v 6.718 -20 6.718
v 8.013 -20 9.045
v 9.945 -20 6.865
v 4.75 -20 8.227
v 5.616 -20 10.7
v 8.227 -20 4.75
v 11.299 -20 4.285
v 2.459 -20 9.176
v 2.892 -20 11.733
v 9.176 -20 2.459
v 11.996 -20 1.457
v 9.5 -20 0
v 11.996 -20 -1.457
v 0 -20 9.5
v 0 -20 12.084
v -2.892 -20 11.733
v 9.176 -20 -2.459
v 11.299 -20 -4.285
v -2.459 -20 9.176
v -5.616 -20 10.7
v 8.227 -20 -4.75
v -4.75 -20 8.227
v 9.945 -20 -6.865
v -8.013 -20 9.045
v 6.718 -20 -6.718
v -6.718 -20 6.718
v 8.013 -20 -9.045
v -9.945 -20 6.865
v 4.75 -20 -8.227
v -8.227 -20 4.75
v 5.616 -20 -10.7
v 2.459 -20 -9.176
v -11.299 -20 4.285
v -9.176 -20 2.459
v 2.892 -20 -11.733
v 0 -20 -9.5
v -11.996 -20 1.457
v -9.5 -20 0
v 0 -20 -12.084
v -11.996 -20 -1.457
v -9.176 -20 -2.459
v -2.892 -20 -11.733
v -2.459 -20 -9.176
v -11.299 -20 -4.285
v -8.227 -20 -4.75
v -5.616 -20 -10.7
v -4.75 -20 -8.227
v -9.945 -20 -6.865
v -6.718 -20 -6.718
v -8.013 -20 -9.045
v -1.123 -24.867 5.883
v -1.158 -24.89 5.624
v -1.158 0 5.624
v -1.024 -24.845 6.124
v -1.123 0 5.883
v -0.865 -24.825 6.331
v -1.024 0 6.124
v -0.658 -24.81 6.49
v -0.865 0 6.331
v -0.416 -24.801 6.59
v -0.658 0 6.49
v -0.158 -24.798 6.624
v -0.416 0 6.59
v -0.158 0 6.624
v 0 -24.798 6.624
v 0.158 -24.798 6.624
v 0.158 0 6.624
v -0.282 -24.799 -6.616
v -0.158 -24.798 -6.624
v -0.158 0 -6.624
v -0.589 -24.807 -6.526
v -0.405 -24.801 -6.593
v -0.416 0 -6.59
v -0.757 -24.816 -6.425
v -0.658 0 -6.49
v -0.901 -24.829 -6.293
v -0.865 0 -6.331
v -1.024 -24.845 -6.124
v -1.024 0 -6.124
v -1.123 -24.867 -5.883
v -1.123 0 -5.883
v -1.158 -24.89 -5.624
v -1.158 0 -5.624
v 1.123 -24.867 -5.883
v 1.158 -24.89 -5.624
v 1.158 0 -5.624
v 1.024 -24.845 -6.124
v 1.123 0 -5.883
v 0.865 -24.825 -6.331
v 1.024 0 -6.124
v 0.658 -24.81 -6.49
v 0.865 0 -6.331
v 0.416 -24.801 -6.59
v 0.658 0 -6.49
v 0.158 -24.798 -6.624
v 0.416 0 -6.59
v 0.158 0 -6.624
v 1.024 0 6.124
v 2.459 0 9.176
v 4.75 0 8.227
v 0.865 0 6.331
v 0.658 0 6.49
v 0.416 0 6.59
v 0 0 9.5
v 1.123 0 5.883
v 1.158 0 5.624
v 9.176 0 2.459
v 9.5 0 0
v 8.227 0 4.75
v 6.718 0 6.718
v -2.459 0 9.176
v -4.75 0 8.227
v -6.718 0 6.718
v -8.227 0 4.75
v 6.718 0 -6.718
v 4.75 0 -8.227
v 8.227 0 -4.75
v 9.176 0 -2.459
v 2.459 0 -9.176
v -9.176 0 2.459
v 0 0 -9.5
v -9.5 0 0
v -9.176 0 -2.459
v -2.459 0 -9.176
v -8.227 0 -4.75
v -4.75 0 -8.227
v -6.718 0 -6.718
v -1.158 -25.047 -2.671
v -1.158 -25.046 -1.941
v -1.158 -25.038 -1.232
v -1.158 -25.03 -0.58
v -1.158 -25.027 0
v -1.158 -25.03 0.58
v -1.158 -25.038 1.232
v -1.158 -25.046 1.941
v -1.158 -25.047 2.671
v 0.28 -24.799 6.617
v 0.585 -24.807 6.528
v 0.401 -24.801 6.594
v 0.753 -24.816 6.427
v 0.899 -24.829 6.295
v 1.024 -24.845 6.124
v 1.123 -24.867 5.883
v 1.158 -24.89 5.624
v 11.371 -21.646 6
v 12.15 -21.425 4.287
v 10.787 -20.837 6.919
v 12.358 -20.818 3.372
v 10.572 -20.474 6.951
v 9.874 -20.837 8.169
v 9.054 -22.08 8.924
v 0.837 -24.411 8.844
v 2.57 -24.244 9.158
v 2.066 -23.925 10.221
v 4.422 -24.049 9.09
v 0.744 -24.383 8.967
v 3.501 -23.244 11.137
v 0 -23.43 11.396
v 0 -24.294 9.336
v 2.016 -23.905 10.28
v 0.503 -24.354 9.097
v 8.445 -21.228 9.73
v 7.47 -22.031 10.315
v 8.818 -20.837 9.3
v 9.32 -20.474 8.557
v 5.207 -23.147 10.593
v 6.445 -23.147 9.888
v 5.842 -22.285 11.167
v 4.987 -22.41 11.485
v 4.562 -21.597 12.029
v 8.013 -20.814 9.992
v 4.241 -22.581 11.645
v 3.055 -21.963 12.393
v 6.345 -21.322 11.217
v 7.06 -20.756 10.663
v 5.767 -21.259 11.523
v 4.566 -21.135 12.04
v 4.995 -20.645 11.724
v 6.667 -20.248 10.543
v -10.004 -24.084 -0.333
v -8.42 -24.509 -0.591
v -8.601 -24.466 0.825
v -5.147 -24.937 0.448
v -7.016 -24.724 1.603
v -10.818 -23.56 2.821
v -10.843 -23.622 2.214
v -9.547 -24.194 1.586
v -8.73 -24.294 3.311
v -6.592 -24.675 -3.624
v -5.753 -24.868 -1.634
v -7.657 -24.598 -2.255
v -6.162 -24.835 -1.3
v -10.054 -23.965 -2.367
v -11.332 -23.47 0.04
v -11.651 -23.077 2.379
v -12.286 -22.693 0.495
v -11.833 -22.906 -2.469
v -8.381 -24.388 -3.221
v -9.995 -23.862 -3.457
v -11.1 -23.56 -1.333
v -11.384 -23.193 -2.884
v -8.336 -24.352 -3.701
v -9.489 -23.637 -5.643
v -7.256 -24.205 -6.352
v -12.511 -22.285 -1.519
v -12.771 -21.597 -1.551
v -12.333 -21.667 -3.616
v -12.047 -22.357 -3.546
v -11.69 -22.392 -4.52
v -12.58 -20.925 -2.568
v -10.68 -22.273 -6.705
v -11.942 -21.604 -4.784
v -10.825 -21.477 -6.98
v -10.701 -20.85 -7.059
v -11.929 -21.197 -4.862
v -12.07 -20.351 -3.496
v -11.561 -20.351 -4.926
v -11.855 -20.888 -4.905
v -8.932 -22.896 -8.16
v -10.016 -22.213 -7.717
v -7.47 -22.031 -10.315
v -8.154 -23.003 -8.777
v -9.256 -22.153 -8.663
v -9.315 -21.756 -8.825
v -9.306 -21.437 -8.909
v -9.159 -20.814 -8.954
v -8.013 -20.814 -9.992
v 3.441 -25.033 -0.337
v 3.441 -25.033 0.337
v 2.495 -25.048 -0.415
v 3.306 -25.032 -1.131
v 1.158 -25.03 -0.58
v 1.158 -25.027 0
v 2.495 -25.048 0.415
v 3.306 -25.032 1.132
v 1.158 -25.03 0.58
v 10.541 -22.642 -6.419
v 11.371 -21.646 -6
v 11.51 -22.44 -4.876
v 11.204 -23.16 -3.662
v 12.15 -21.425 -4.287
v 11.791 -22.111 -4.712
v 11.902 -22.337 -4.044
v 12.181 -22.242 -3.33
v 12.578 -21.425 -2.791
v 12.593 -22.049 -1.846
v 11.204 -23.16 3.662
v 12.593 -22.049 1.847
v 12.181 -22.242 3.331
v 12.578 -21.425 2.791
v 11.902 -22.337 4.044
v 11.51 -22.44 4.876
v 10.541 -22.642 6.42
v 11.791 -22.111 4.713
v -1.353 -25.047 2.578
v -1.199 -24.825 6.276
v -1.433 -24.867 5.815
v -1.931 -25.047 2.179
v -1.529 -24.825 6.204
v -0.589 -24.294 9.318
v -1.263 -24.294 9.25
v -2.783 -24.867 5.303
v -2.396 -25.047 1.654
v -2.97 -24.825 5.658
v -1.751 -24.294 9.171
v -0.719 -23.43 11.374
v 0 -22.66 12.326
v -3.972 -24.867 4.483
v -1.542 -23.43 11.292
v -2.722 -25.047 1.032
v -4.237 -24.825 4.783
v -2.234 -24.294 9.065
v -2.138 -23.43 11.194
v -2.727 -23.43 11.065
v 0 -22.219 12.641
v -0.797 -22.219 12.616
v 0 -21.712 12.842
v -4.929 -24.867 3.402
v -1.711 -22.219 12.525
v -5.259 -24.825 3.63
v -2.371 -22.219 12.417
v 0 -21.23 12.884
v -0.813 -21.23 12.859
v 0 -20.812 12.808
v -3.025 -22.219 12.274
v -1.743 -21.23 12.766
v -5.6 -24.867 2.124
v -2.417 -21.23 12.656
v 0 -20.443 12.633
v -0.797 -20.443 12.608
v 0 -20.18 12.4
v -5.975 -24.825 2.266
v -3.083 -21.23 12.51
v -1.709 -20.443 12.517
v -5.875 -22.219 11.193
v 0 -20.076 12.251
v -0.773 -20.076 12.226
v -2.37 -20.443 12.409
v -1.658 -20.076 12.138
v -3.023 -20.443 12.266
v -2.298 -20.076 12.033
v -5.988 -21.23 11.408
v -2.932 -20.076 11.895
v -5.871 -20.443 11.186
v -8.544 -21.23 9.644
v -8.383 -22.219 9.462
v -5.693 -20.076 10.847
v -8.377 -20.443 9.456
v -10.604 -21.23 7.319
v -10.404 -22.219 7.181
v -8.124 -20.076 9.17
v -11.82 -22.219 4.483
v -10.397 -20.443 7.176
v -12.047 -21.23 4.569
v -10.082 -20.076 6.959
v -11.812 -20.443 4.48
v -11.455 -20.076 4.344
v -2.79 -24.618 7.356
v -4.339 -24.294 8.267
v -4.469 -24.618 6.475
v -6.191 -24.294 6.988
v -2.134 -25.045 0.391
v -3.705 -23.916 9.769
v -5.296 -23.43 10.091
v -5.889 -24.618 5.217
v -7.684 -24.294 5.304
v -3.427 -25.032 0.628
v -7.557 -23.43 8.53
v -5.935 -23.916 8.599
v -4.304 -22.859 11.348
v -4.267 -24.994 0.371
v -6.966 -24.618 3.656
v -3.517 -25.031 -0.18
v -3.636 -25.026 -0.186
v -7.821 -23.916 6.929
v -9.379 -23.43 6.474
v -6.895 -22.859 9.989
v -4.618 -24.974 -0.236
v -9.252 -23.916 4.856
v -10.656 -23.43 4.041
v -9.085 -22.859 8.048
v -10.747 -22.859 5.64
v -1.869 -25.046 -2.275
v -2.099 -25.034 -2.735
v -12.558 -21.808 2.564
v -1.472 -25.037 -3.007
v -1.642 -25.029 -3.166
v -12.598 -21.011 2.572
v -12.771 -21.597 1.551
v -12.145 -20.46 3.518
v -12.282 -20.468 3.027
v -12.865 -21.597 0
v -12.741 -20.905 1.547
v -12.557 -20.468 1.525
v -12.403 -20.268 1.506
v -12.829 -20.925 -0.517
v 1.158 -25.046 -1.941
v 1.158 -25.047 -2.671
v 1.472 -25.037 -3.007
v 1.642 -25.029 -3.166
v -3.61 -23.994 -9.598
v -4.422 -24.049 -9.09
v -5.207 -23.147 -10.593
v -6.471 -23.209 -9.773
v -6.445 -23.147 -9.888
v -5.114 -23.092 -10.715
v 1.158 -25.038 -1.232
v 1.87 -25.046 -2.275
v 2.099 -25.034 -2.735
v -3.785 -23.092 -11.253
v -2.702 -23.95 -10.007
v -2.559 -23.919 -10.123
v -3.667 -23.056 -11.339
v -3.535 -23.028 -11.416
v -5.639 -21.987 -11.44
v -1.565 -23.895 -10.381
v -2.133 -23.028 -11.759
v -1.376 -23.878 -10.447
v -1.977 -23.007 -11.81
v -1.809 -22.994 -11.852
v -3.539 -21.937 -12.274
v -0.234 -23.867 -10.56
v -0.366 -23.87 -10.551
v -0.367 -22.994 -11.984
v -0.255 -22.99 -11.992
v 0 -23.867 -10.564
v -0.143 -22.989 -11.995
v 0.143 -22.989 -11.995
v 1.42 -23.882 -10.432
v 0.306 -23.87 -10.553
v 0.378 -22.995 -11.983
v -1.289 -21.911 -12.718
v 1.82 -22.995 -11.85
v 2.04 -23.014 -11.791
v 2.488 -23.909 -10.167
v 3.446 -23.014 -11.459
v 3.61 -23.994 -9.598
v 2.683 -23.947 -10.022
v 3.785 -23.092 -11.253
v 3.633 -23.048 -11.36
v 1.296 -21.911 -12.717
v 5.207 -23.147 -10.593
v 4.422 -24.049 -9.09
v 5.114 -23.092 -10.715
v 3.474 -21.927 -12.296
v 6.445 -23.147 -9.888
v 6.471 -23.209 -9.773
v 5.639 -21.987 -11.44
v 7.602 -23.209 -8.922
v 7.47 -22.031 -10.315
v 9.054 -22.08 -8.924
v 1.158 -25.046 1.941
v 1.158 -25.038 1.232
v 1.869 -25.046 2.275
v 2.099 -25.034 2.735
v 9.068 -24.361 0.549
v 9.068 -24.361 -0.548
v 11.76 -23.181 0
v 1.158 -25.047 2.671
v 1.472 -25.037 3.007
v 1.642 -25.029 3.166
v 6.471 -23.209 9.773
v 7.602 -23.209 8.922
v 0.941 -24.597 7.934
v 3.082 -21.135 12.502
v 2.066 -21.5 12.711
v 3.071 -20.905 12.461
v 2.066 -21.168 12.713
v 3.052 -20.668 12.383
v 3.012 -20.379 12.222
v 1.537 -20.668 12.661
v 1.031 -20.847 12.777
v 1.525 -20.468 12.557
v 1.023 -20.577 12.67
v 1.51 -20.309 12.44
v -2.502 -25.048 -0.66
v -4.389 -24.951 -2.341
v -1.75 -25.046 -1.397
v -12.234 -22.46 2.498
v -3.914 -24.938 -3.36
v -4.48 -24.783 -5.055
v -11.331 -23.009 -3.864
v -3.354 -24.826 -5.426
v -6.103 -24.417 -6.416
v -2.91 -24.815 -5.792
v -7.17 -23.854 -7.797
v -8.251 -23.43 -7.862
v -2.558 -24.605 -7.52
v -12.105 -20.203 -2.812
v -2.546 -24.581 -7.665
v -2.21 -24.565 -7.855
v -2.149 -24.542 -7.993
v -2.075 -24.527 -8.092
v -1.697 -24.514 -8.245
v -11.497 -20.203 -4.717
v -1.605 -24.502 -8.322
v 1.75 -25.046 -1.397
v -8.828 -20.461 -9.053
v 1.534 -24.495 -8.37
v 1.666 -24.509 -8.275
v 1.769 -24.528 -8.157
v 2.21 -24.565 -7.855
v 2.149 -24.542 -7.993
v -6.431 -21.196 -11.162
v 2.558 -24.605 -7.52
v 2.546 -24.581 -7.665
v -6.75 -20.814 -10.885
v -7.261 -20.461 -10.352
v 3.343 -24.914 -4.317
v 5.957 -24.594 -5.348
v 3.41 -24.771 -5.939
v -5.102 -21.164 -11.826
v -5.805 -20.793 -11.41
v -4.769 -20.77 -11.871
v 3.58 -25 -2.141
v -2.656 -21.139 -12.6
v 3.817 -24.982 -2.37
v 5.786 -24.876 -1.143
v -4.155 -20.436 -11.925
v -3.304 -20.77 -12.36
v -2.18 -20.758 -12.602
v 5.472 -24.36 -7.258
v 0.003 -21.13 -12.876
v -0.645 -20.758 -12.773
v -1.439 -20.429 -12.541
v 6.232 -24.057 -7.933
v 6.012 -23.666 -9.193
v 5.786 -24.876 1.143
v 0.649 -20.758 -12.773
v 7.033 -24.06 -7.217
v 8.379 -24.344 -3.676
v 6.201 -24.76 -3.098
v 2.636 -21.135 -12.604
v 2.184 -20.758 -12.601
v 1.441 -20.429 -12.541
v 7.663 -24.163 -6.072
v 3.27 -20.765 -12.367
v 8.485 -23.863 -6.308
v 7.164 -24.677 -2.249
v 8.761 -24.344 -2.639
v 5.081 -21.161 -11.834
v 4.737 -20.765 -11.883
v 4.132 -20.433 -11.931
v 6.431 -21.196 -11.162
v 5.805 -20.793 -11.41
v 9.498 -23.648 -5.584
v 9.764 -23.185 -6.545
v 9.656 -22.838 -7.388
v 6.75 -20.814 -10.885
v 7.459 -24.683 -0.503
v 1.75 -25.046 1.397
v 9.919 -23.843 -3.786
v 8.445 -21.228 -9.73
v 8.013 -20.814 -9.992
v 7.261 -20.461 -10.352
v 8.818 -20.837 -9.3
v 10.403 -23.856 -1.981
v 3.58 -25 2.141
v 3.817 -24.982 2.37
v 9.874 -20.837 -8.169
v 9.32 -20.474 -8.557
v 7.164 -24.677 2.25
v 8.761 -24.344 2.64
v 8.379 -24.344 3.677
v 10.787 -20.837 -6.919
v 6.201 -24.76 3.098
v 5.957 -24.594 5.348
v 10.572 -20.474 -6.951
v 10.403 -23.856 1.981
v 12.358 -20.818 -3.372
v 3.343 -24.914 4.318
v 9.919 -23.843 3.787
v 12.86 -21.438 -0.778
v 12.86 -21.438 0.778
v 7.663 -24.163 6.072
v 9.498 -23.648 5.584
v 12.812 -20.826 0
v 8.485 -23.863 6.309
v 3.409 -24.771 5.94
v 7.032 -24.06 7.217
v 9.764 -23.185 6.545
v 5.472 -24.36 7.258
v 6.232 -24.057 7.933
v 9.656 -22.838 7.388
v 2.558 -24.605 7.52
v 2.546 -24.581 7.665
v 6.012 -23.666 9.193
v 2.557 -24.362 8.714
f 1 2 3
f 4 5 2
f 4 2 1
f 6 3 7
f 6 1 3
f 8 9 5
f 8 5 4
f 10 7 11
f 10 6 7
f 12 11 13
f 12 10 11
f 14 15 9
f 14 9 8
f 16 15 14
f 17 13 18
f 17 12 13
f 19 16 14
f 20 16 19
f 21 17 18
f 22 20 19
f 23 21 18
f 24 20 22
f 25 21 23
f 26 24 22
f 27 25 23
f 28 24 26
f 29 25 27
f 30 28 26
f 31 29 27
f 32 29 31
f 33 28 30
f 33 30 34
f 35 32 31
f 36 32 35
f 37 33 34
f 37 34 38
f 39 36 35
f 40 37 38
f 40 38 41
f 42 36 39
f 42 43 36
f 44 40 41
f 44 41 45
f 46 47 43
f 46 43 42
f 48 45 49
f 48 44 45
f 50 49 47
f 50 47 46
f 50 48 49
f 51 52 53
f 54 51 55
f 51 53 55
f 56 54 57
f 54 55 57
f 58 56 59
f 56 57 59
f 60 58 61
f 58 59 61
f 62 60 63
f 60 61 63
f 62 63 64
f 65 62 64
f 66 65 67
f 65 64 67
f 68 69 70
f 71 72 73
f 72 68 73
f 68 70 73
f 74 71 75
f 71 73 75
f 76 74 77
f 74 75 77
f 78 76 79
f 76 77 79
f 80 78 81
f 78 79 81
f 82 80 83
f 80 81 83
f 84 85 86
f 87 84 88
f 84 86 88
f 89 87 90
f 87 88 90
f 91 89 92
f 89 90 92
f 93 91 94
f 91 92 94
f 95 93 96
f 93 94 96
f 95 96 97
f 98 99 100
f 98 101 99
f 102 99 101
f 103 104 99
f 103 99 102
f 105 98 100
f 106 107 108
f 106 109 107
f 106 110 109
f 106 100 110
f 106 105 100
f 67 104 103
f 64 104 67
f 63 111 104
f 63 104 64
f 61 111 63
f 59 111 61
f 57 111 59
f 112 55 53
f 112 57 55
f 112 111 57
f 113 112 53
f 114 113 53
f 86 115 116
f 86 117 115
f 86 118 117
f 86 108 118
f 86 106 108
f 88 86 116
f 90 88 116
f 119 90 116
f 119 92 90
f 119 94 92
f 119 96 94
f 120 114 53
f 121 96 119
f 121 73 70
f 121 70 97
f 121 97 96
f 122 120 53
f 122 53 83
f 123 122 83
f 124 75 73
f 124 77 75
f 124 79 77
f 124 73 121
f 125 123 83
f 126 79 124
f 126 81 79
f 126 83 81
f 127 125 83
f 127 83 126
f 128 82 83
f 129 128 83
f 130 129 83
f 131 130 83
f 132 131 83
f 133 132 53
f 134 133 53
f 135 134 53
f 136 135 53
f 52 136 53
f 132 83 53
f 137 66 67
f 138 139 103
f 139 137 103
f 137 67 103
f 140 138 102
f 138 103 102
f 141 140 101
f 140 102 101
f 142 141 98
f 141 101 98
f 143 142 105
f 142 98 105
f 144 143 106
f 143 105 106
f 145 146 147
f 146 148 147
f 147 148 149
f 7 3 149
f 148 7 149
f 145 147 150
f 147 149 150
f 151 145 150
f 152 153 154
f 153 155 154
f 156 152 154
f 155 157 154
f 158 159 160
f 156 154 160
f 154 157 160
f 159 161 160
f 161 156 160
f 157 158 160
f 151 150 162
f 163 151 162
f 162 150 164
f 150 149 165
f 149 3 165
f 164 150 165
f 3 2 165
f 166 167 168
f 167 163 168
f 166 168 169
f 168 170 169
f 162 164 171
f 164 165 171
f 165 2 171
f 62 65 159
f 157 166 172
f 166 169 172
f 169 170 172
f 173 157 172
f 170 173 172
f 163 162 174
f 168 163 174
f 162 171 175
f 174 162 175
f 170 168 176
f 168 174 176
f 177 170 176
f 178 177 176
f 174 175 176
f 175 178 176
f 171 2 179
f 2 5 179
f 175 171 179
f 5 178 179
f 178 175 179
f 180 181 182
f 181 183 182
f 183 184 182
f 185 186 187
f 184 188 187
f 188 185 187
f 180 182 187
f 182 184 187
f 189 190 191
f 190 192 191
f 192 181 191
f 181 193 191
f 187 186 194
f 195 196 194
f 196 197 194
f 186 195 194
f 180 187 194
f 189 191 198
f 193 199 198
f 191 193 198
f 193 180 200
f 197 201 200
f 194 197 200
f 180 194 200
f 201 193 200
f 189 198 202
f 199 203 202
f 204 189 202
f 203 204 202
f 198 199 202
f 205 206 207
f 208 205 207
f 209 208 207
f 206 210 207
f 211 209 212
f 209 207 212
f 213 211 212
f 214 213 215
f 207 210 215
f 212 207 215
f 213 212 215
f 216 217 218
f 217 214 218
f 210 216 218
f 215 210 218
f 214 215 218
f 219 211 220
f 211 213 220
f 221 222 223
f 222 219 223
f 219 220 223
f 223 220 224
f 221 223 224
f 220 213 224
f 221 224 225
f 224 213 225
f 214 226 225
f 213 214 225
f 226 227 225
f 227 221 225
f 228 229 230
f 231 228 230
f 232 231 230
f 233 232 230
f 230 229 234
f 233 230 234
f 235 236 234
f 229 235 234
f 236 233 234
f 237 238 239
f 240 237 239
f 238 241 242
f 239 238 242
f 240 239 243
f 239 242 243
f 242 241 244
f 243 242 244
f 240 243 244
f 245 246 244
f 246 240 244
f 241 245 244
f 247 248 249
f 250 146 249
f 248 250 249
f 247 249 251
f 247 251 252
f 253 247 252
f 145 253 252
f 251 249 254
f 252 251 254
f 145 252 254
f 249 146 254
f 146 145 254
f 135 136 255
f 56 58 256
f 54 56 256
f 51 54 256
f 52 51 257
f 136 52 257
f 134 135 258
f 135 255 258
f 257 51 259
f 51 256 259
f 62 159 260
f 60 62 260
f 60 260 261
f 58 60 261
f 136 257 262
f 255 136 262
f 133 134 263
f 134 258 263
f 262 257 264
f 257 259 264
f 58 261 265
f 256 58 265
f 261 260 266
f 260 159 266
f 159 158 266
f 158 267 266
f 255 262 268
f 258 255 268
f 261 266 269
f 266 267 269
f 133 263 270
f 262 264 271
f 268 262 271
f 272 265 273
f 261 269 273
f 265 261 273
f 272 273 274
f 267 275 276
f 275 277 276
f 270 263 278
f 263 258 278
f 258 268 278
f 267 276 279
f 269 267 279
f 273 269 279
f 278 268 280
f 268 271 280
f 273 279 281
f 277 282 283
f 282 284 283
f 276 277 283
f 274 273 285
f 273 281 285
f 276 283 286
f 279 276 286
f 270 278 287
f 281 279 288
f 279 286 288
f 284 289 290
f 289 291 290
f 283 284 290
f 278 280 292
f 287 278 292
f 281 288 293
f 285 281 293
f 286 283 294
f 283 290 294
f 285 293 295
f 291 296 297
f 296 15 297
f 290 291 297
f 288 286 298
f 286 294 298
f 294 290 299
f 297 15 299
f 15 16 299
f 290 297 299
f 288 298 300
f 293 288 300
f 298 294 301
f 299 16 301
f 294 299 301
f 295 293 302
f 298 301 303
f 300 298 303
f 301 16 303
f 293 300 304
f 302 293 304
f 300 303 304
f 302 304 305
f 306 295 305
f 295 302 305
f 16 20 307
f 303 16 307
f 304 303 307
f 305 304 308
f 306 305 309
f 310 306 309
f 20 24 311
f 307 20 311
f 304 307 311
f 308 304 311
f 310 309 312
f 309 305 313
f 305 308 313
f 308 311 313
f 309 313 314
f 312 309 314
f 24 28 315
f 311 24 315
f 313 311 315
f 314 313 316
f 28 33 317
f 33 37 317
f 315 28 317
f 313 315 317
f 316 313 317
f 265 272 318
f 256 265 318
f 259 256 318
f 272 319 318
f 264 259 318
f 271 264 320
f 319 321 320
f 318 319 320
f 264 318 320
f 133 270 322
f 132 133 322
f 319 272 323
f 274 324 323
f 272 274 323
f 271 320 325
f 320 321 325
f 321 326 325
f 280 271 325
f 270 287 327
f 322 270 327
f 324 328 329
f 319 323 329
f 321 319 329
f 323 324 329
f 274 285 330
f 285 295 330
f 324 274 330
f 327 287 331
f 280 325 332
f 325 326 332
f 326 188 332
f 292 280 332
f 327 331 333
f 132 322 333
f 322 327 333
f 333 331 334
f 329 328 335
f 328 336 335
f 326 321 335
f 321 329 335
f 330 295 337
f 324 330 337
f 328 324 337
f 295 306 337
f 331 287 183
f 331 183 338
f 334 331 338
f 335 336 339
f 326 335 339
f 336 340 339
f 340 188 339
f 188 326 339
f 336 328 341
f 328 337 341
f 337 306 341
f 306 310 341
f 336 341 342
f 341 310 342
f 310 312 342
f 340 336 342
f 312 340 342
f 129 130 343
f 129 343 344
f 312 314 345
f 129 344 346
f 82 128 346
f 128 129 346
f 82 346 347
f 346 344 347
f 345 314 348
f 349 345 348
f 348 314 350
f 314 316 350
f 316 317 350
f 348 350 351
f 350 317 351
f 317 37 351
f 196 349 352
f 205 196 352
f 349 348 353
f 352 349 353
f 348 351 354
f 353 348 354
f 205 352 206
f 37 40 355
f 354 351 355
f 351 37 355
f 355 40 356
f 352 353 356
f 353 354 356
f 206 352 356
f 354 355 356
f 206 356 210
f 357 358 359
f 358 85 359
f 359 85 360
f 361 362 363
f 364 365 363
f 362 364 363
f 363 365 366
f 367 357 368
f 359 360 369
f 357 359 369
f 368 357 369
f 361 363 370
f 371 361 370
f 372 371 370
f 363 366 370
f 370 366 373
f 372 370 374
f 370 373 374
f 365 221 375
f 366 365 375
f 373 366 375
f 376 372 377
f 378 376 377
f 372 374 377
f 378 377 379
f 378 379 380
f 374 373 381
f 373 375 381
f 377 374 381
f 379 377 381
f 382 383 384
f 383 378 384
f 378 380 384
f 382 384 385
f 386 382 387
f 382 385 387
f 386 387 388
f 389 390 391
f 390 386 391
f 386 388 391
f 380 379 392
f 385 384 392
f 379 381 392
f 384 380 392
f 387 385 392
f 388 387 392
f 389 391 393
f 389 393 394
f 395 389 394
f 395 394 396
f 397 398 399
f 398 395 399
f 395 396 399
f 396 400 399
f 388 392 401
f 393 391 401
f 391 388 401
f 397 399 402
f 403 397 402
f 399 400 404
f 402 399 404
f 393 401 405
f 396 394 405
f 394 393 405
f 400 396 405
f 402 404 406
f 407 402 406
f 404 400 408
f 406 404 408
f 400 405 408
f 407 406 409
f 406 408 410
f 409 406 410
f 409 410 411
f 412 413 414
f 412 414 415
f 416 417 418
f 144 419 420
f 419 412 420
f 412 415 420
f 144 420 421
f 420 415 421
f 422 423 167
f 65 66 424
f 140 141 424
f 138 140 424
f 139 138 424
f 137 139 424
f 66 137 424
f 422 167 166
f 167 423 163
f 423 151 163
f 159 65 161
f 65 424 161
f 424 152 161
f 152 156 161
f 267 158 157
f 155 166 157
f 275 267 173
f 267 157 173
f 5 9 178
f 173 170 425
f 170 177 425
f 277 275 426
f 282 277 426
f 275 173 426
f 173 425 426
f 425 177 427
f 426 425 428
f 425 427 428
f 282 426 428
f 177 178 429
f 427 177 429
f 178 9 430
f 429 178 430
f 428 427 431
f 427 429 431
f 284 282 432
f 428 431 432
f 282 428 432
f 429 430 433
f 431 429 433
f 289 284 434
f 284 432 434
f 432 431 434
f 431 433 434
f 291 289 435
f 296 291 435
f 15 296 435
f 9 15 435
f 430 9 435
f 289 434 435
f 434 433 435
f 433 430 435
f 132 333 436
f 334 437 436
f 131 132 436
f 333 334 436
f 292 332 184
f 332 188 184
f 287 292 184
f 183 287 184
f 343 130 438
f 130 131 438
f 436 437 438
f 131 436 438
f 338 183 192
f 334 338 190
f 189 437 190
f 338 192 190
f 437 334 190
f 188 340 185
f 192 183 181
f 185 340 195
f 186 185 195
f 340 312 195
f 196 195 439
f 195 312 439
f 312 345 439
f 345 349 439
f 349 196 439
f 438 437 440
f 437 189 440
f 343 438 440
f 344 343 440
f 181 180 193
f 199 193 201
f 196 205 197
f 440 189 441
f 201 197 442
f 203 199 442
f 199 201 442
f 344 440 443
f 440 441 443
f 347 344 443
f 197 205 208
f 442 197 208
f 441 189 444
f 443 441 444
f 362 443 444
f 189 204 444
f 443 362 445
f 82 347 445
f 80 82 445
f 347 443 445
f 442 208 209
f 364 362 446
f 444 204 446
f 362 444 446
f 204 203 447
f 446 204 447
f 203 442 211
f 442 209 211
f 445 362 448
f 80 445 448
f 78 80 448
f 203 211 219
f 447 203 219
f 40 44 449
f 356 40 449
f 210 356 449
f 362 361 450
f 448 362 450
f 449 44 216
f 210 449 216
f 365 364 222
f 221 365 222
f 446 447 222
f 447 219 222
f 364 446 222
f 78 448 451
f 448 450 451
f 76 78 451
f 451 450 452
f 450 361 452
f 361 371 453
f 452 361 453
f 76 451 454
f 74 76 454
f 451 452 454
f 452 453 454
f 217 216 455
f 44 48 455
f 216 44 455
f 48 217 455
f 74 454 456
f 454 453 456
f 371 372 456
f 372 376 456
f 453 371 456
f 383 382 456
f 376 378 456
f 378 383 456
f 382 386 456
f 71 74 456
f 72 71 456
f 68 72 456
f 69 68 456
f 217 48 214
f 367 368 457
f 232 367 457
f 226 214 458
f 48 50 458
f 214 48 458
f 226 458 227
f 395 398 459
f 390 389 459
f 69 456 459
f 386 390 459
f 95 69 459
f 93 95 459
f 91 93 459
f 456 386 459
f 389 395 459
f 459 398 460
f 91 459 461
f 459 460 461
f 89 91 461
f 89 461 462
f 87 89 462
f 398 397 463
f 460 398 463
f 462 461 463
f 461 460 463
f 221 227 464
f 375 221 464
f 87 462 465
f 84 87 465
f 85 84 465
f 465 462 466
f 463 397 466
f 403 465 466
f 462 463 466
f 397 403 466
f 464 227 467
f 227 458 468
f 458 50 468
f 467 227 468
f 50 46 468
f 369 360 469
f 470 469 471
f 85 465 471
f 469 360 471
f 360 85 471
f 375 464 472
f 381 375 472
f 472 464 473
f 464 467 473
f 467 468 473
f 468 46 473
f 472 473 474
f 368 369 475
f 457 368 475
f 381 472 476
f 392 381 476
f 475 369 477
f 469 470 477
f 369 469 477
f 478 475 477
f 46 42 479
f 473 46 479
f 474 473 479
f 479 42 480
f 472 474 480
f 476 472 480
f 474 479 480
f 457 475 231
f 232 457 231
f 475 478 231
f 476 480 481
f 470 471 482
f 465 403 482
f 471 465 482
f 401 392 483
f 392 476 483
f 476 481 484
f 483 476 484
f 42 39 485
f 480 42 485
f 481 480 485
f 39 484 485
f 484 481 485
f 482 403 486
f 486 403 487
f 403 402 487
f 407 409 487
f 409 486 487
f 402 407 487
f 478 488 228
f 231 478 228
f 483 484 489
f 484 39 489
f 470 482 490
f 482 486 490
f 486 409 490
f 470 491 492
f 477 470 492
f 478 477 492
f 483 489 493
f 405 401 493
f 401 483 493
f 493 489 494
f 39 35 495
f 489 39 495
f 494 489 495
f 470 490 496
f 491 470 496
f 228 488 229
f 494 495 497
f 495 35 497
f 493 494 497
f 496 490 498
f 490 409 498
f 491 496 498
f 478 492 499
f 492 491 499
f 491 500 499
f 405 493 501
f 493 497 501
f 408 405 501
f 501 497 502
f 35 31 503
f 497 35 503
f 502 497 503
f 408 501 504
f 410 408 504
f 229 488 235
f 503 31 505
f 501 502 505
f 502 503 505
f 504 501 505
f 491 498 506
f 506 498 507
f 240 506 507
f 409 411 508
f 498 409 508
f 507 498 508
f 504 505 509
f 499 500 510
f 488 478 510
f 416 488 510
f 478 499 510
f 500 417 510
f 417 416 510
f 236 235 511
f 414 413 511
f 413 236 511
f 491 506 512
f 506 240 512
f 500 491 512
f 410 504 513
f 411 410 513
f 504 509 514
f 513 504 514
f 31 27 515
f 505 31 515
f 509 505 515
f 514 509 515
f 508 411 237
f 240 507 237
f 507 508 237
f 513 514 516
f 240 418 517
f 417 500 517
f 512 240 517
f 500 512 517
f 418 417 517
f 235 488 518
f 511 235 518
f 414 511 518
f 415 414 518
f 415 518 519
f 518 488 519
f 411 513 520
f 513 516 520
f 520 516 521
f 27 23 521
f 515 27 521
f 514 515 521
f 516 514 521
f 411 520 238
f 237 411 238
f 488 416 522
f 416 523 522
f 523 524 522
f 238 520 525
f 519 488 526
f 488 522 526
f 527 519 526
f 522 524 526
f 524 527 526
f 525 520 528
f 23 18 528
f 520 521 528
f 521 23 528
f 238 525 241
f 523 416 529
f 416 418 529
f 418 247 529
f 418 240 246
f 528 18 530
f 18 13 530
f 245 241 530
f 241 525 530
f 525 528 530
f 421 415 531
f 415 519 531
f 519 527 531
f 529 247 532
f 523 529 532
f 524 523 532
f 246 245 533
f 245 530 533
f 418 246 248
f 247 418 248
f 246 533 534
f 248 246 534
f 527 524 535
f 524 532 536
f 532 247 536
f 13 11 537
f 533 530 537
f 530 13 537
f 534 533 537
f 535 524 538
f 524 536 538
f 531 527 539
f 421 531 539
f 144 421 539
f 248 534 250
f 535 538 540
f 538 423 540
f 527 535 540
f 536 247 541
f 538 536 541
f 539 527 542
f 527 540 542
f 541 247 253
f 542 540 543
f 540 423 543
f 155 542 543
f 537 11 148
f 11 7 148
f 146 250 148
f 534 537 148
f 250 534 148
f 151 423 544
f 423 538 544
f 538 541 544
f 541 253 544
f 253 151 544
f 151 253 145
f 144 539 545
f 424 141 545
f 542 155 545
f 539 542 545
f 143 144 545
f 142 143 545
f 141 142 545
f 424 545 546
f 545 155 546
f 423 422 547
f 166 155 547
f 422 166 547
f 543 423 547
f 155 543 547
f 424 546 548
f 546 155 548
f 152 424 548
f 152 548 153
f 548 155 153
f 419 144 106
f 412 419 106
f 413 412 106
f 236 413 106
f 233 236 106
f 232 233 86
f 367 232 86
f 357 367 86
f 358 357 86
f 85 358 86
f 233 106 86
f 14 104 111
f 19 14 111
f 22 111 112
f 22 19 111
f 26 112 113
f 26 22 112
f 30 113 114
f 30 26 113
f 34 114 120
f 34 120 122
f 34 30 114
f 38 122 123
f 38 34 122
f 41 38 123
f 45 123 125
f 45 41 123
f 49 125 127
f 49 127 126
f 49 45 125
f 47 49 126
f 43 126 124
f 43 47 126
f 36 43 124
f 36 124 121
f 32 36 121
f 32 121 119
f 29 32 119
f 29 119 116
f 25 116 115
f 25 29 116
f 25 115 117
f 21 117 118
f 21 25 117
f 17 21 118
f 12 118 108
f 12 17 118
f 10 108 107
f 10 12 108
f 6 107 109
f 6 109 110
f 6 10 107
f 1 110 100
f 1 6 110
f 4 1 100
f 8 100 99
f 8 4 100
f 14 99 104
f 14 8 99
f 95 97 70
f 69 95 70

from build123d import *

# Parameters (mm, degrees)
F3_DEPTH = 25.0491994545


with BuildPart() as f1:
    # F0 (on Right) → F1 (revolve)
    with BuildSketch(Plane.YZ):
        with BuildLine():
            Line((-25, 0), (0, 0))
            Line((0, 0), (0, 9.5))
            Line((0, 9.5), (-20, 9.5))
            Line((-20, 9.5), (-20, 12.0843162353))
            add(Edge.make_bspline(
                [(-25, 0), (-25.0620774302, 2.5433010343), (-25.0716983516, 3.4419194063), (-24.5929996185, 10.3825960783), (-21.9290160892, 13.4230087933), (-20.1981659595, 12.6572140375), (-20, 12.0843162353)],
                knots=[0, 0, 0, 0, 0.2637629191, 0.5846935152, 0.8278932887, 1, 1, 1, 1], degree=3))
        make_face()
    revolve(axis=Axis((0, -12.5, 0), (0, -1, 0)))

    # F2 (on face) → F3 (cut, through all)
    with BuildSketch(Plane(origin=(0, 0, 0), x_dir=(-1, 0, 0), z_dir=(0, 1, 0))):
        with BuildLine():
            ThreePointArc((1.1575235985, 5.6240597516), (0.8646303797, 6.3311665328), (0.1575235985, 6.6240597516))
            Line((0.1575235985, 6.6240597516), (-0.1575235985, 6.6240597516))
            ThreePointArc((-0.1575235985, 6.6240597516), (-0.8646303797, 6.3311665328), (-1.1575235985, 5.6240597516))
            Line((-1.1575235985, 5.6240597516), (-1.1575235985, -5.6240597516))
            ThreePointArc((-1.1575235985, -5.6240597516), (-0.8646303797, -6.3311665328), (-0.1575235985, -6.6240597516))
            Line((-0.1575235985, -6.6240597516), (0.1575235985, -6.6240597516))
            ThreePointArc((0.1575235985, -6.6240597516), (0.8646303797, -6.3311665328), (1.1575235985, -5.6240597516))
            Line((1.1575235985, -5.6240597516), (1.1575235985, 5.6240597516))
        make_face()
    extrude(amount=-F3_DEPTH, mode=Mode.SUBTRACT)


solid = f1.part
